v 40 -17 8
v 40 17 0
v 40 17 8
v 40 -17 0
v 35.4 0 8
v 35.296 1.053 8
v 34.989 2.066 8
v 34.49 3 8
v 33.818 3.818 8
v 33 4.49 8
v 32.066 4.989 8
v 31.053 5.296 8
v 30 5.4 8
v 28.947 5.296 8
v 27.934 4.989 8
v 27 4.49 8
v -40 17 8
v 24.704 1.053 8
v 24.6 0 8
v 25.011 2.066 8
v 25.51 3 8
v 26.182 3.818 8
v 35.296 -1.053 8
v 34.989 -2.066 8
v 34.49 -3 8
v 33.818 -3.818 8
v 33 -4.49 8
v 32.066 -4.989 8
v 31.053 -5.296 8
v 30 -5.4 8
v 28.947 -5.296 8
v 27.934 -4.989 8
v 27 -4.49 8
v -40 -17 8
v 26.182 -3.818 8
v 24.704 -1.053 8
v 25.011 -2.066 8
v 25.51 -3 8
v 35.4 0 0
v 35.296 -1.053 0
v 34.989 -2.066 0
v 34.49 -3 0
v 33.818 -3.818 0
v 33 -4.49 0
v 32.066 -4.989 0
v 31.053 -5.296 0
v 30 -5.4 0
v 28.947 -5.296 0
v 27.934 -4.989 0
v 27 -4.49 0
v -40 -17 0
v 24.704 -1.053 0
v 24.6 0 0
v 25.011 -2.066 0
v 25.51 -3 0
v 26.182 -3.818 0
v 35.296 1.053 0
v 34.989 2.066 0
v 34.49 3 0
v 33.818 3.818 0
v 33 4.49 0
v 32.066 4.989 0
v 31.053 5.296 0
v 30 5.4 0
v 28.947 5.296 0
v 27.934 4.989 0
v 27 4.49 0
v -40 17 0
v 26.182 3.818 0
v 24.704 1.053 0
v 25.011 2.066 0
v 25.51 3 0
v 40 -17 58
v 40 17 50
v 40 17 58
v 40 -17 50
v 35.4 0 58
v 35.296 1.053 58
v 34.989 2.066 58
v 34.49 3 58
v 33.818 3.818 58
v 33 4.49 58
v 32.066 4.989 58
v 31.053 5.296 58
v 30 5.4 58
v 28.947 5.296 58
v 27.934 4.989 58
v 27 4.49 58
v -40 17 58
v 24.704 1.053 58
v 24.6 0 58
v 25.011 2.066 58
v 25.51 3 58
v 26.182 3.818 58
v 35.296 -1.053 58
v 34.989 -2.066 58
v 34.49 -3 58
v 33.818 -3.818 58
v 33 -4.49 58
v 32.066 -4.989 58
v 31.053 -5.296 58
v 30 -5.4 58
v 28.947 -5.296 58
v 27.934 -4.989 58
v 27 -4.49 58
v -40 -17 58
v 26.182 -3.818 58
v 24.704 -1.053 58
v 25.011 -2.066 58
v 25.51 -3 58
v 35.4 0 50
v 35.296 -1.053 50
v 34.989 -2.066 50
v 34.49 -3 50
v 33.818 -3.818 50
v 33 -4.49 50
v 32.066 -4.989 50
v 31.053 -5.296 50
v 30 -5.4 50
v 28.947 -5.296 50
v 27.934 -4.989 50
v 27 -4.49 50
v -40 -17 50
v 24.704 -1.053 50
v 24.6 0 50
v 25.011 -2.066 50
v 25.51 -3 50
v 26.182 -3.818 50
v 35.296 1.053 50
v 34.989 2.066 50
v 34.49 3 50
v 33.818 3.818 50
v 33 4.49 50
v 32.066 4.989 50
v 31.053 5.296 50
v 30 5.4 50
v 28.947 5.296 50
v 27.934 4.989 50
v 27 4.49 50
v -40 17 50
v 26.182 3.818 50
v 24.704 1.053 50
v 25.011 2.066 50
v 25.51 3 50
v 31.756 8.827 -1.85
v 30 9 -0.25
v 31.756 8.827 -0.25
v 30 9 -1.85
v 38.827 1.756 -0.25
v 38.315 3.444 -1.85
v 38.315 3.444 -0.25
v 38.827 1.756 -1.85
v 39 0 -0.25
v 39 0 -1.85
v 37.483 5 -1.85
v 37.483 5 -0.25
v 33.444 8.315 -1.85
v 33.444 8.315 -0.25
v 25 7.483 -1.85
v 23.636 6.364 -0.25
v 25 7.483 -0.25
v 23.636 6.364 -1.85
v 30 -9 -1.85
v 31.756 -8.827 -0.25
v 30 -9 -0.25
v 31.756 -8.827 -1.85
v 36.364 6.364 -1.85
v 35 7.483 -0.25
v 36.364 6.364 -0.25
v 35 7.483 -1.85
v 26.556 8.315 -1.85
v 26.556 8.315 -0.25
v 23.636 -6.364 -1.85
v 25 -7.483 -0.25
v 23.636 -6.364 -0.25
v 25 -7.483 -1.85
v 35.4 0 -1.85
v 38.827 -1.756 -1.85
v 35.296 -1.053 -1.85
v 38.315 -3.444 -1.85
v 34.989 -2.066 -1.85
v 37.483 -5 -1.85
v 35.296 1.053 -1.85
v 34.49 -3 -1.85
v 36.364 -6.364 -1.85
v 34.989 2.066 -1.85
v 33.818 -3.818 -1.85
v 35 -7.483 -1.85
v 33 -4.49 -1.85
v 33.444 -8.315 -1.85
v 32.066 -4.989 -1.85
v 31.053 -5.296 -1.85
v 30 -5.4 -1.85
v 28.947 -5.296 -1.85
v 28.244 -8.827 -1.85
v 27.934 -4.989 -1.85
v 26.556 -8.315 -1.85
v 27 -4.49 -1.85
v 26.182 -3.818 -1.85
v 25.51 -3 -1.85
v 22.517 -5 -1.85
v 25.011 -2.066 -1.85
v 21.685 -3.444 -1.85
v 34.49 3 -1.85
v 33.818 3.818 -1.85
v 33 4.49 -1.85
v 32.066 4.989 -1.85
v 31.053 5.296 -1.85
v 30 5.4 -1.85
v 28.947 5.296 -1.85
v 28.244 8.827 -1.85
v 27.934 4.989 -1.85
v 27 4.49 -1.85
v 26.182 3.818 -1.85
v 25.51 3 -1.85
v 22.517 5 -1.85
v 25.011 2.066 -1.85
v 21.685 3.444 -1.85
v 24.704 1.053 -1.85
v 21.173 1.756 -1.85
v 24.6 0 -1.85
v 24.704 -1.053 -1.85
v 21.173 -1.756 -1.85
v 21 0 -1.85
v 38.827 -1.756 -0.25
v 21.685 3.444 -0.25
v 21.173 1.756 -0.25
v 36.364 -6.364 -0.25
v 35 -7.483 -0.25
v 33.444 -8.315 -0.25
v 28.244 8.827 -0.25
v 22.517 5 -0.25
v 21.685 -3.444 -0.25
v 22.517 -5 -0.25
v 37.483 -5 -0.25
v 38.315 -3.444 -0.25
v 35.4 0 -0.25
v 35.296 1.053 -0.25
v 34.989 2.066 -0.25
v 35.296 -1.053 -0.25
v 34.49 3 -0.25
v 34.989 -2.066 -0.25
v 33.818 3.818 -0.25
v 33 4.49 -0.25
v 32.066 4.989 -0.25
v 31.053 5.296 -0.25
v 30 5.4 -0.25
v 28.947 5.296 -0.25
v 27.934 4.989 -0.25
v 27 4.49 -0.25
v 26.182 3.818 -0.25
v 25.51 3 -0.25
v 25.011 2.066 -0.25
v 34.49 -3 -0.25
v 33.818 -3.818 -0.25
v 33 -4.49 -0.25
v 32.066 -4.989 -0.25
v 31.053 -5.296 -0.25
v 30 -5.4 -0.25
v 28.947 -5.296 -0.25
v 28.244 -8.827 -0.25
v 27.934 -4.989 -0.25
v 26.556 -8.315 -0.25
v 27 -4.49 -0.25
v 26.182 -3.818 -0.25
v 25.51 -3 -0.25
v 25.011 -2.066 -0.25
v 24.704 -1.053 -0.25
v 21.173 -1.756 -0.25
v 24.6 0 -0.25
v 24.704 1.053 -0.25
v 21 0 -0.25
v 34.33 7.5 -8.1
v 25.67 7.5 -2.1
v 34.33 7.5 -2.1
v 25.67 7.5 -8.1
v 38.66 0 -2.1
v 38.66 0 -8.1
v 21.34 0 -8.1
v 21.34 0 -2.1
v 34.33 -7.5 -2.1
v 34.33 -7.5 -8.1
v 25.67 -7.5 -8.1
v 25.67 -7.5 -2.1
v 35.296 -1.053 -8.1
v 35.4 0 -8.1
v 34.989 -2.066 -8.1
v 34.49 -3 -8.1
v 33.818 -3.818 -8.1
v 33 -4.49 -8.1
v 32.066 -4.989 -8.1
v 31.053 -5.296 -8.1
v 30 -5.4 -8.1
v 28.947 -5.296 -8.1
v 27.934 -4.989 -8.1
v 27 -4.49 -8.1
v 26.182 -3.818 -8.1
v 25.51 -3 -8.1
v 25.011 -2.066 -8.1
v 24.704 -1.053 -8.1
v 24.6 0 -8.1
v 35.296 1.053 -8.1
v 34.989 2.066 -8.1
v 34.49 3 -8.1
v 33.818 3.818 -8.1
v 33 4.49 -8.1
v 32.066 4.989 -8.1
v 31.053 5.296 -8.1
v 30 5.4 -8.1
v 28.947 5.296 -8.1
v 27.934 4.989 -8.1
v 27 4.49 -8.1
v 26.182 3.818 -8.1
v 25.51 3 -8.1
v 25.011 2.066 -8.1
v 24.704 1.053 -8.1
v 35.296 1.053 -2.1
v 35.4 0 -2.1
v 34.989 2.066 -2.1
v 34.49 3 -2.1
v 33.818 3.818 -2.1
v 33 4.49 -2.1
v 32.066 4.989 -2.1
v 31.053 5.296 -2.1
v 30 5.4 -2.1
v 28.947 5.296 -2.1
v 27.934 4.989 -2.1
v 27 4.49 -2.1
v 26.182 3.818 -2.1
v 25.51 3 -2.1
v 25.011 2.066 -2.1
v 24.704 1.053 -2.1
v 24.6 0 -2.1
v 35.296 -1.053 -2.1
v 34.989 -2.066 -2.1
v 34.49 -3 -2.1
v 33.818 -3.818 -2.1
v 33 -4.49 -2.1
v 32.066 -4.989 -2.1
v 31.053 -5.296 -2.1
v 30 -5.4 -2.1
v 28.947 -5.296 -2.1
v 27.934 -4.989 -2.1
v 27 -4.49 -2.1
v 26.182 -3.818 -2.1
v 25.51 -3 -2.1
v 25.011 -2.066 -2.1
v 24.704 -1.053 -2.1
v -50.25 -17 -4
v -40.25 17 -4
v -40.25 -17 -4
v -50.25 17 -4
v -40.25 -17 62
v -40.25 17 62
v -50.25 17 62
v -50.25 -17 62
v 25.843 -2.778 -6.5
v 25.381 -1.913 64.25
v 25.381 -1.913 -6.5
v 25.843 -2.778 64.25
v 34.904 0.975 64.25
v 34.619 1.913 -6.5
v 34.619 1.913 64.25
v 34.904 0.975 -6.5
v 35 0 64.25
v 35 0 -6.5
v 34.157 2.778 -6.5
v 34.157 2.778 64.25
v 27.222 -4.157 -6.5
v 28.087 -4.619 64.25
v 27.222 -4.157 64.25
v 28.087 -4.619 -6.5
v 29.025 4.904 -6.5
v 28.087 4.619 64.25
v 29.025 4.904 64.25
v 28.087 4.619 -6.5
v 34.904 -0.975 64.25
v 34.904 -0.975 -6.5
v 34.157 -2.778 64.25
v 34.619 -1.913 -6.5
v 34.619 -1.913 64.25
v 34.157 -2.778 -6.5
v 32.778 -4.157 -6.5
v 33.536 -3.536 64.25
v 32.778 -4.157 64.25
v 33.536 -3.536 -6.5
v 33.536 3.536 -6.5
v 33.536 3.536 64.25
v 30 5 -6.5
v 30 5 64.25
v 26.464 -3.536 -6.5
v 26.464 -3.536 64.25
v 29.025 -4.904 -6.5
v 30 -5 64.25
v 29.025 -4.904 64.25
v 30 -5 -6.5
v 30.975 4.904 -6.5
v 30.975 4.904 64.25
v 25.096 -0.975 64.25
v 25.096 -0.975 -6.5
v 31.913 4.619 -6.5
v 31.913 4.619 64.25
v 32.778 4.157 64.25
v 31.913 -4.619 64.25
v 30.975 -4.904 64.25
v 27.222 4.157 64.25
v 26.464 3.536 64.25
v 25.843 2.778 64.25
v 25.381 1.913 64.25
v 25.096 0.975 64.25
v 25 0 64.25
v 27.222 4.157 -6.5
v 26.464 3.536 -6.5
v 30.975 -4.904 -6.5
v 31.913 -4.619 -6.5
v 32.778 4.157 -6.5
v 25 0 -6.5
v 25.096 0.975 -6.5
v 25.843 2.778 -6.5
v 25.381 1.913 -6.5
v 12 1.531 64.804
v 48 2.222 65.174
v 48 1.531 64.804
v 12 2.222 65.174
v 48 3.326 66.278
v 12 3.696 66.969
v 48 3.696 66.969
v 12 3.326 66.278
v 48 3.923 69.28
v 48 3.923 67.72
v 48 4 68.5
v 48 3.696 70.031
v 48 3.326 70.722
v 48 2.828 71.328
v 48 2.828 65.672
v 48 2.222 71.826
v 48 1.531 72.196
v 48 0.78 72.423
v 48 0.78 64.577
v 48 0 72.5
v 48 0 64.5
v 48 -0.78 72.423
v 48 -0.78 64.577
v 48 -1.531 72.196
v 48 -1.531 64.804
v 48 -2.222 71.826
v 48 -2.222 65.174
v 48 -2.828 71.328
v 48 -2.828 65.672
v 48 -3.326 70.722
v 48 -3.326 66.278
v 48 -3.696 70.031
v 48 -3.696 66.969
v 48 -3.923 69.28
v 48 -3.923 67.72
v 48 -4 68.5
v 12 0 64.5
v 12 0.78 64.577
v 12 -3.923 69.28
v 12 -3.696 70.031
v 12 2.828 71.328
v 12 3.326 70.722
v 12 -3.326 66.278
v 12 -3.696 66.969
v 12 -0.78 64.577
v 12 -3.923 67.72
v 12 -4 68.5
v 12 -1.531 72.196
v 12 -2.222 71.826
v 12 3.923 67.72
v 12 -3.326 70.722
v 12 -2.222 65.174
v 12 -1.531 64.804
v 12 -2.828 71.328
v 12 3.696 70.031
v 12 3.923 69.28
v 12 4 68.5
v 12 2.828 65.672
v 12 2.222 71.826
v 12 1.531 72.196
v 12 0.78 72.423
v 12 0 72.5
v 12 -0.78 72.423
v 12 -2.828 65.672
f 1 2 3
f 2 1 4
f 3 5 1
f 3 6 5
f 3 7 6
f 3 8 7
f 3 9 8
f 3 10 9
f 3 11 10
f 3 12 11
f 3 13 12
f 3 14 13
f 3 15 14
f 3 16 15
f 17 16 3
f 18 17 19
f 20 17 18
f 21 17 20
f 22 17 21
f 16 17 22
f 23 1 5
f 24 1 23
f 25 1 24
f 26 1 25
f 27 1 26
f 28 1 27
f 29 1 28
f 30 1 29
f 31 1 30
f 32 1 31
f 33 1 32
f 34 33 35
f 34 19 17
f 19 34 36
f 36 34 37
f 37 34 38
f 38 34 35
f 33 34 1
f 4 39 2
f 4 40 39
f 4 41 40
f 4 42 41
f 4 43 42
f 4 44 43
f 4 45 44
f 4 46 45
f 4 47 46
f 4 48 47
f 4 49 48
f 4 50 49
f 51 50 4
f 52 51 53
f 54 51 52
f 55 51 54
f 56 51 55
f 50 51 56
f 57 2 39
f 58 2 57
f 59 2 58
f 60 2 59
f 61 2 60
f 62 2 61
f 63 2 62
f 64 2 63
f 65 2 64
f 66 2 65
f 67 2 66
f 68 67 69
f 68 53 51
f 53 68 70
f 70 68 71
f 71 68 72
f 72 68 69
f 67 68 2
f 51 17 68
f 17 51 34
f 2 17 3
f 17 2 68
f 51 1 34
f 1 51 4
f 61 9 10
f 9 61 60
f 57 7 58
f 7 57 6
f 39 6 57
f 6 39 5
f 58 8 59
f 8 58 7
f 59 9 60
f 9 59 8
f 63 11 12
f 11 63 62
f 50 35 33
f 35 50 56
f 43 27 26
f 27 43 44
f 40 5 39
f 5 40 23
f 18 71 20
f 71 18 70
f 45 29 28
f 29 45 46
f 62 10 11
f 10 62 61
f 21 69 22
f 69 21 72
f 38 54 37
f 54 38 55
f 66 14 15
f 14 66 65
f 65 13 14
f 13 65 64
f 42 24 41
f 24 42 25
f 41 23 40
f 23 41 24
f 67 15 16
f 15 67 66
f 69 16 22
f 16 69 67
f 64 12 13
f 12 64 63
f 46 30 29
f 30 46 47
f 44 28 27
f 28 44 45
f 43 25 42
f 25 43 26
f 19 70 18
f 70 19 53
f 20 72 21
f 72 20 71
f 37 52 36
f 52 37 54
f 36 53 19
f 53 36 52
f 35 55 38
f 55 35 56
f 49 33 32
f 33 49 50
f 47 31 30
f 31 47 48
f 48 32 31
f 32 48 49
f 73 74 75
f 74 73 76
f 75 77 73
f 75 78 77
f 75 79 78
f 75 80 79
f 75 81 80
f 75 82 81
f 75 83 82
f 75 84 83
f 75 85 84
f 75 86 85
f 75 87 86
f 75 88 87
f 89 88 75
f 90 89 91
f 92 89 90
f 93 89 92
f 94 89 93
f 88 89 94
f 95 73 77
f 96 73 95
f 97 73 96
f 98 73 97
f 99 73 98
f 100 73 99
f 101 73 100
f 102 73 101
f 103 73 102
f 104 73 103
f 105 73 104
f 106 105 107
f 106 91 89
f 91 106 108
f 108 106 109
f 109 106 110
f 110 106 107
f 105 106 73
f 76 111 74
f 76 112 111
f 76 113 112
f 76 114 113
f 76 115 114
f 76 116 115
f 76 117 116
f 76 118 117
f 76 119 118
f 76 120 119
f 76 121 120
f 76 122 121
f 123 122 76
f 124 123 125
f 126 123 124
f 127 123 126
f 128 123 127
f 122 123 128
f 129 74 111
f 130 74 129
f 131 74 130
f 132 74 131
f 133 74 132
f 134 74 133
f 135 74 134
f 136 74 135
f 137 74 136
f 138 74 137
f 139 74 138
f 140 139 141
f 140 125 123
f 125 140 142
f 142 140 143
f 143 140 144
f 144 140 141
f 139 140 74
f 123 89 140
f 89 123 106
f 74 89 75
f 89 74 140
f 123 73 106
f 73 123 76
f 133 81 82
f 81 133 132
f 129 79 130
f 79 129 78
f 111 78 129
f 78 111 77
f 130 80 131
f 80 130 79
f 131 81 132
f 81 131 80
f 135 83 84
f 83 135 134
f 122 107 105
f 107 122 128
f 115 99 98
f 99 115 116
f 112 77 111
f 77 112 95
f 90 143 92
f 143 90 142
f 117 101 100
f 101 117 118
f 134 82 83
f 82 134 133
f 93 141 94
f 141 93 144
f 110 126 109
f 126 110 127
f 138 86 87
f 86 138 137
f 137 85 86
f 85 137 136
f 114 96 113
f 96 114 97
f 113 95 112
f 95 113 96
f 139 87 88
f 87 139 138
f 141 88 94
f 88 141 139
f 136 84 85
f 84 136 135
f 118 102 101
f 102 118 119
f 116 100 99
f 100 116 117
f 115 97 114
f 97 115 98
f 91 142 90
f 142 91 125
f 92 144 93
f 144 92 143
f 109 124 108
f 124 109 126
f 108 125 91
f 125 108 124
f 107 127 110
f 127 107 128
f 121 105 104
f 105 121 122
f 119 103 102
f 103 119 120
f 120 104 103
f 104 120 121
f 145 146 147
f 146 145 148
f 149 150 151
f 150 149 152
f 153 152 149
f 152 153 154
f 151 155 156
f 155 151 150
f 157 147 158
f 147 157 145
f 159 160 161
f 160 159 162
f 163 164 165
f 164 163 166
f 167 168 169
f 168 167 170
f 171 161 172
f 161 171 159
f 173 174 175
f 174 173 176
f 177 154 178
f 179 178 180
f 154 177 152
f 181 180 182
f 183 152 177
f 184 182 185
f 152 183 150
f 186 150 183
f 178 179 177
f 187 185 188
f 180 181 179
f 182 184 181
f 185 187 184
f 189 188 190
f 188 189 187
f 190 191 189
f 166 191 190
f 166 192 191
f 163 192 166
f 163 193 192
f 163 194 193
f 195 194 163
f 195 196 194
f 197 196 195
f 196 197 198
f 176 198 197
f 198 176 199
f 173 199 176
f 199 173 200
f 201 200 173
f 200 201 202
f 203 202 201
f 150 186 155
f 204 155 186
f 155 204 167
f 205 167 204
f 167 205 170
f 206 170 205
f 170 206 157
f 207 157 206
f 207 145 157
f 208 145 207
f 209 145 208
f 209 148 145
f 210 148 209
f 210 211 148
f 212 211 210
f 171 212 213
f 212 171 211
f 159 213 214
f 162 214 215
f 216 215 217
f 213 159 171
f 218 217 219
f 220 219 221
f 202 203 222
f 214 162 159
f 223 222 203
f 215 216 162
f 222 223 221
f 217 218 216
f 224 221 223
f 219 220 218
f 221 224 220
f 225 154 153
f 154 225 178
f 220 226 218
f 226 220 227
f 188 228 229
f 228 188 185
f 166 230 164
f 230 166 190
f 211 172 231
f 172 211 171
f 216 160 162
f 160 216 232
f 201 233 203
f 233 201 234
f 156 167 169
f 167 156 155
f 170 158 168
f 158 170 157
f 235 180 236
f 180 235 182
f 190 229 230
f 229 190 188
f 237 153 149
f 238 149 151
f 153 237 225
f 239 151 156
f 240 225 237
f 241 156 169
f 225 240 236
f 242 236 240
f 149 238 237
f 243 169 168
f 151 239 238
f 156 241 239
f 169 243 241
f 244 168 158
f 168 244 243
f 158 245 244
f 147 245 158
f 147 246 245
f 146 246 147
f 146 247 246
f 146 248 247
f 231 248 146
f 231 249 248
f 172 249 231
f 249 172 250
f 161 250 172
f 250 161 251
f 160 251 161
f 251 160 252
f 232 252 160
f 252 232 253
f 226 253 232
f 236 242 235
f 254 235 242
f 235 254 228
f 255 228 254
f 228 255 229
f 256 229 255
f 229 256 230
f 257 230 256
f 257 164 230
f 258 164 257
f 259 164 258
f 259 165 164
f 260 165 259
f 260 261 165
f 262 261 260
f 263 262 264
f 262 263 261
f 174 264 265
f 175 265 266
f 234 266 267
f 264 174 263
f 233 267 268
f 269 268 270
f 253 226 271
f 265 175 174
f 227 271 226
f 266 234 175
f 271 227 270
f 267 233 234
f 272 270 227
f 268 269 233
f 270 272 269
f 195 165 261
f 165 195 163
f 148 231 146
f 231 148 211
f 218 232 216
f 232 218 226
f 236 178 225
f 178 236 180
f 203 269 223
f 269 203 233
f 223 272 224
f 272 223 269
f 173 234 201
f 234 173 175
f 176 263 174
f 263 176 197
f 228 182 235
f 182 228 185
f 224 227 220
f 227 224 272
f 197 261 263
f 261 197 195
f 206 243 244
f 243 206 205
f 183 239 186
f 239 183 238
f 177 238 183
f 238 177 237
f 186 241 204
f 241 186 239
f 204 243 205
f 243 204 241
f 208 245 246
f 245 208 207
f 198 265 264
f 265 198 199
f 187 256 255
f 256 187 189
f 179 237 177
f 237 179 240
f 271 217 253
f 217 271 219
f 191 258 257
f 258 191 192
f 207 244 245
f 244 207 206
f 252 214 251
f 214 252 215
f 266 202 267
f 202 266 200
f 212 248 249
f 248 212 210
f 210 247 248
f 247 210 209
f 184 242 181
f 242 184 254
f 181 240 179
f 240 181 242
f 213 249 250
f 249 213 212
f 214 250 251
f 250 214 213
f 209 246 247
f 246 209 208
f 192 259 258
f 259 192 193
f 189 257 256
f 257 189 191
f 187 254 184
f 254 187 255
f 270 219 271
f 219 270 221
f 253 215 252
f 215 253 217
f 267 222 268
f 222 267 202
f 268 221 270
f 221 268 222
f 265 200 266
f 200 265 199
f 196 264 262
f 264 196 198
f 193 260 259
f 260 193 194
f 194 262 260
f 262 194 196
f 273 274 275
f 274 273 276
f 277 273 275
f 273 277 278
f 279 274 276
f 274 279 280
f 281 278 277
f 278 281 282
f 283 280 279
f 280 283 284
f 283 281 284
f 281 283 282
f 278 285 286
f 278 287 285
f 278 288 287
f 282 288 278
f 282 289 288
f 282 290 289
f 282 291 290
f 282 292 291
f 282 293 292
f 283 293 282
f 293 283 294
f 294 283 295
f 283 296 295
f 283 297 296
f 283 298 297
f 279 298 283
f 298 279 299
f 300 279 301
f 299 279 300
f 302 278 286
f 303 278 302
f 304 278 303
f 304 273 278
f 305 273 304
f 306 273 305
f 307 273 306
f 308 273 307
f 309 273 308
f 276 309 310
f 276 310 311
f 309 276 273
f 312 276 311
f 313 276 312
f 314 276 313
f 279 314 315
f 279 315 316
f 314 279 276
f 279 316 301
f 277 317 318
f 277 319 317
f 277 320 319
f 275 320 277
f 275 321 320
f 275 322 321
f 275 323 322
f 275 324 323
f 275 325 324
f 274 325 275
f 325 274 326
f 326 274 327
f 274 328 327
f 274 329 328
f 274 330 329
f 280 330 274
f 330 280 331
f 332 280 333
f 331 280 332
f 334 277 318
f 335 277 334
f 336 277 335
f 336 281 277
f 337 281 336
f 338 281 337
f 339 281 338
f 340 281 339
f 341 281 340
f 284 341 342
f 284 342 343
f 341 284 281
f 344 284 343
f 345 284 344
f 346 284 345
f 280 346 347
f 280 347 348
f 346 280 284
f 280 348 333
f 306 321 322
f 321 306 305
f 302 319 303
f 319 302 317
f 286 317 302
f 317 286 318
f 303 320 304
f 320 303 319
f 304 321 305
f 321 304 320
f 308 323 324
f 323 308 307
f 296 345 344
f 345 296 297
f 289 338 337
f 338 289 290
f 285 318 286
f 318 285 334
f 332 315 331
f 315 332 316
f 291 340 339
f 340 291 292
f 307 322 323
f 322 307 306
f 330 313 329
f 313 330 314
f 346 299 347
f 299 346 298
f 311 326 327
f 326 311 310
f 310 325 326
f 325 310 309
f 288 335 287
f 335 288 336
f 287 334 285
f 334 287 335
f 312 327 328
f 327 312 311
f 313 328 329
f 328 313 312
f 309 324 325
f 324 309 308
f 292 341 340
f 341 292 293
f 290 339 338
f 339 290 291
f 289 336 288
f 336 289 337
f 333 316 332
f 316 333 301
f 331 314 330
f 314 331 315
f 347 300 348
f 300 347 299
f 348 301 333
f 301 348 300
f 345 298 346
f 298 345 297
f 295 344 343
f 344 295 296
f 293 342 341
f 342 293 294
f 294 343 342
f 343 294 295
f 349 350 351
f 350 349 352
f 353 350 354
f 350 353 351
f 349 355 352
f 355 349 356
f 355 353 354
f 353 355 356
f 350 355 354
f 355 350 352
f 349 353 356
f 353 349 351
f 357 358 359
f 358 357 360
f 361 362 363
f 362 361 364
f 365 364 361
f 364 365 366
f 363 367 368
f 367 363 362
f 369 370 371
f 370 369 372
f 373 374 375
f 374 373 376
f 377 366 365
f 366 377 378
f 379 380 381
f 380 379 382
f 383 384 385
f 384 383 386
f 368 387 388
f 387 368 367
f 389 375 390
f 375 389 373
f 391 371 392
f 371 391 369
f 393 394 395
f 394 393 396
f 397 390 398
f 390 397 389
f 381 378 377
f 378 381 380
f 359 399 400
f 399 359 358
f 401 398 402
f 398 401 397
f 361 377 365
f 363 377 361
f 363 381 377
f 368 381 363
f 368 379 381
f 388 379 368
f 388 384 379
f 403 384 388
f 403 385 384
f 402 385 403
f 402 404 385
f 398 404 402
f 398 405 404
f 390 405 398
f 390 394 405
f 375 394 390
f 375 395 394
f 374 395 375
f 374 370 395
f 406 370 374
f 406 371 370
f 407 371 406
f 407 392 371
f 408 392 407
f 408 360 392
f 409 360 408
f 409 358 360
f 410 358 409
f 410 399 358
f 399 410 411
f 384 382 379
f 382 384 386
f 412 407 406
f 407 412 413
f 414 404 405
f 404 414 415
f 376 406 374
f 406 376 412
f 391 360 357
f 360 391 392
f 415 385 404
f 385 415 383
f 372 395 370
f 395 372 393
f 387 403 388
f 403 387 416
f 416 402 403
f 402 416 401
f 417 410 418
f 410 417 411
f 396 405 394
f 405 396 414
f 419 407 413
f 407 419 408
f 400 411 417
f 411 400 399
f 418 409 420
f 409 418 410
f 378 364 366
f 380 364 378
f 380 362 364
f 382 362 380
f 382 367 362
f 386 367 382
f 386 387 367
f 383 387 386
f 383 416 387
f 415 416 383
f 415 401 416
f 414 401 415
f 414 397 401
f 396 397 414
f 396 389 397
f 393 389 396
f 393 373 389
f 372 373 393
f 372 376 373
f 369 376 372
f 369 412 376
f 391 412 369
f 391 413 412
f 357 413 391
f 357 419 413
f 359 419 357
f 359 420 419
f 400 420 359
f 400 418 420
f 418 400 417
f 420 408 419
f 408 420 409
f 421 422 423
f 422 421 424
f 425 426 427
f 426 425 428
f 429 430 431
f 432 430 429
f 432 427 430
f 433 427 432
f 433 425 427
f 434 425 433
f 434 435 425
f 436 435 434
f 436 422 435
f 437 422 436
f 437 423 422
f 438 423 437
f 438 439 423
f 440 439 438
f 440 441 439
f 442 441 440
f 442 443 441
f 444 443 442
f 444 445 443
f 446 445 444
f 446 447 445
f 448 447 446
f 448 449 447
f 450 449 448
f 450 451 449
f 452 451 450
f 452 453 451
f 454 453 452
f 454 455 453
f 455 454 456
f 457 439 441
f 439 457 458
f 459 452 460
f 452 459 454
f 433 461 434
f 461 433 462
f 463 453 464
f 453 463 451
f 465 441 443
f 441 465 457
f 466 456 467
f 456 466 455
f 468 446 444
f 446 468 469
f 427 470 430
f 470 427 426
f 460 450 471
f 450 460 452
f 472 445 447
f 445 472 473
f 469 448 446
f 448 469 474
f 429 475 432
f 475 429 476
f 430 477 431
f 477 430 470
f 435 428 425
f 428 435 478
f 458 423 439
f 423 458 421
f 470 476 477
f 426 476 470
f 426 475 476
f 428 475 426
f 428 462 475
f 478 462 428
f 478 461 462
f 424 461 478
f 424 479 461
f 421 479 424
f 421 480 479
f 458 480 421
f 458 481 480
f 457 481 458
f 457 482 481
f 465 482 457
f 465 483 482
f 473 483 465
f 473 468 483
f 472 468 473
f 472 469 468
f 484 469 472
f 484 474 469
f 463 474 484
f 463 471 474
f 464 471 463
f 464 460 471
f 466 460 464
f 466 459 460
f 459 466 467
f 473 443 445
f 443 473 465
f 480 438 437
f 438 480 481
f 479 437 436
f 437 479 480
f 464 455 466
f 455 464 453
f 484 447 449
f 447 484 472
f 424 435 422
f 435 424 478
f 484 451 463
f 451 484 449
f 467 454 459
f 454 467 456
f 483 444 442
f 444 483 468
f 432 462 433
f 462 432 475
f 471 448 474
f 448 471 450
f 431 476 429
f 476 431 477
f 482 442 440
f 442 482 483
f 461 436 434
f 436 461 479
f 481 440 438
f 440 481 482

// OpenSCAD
$fn = 32;

// ------------------------------------------------------------------------
// C clamp: throat 50 mm, screw d10
// Every part is its own module, assembly() places every instance.
// ------------------------------------------------------------------------

// --- part 1 ---
module clamp_arm() {
  difference() {
    translate([-40, -17, 0]) cube([80, 34, 8]);
    translate([30, 0, -1]) cylinder(h = 10, d = 10.8);
  }
}

// --- part 2 ---
module clamp_spine() {
  difference() {
    translate([-33, -17, 0]) cube([66, 34, 10]);
  }
}

// --- part 3 ---
module clamp_screw() {
  translate([0, 0, -35.375]) cylinder(h = 70.75, d = 10);
}

// --- part 4 ---
module clamp_washer() {
  difference() {
      translate([0, 0, 0]) cylinder(h = 1.6, d = 18);
      translate([0, 0, -1]) cylinder(h = 3.6, d = 10.8);
    }
}

// --- part 5 ---
module clamp_nut() {
  difference() {
    linear_extrude(height = 6) polygon(points = [[8.66, 0], [4.33, 7.5], [-4.33, 7.5], [-8.66, 0], [-4.33, -7.5], [4.33, -7.5]]);
    translate([0, 0, -1]) cylinder(h = 8, d = 10.8);
  }
}

// --- part 6 ---
module tommy_bar() {
  translate([0, 0, -18]) cylinder(h = 36, d = 8);
}

// --- assembly ---
module assembly() {
  color([0.80, 0.24, 0.20]) translate([0, 0, 0]) rotate([0, 0, 0]) clamp_arm();
  color([0.20, 0.45, 0.75]) translate([0, 0, 50]) rotate([0, 0, 0]) clamp_arm();
  color([0.25, 0.62, 0.32]) translate([-50.25, 0, 29]) rotate([0, 90, 0]) clamp_spine();
  color([0.92, 0.70, 0.18]) translate([30, 0, 28.875]) rotate([0, 0, 0]) clamp_screw();
  color([0.58, 0.35, 0.70]) translate([30, 0, -1.85]) rotate([0, 0, 0]) clamp_washer();
  color([0.16, 0.66, 0.66]) translate([30, 0, -8.1]) rotate([0, 0, 0]) clamp_nut();
  color([0.85, 0.48, 0.18]) translate([30, 0, 68.5]) rotate([0, 90, 0]) tommy_bar();
}

assembly();
